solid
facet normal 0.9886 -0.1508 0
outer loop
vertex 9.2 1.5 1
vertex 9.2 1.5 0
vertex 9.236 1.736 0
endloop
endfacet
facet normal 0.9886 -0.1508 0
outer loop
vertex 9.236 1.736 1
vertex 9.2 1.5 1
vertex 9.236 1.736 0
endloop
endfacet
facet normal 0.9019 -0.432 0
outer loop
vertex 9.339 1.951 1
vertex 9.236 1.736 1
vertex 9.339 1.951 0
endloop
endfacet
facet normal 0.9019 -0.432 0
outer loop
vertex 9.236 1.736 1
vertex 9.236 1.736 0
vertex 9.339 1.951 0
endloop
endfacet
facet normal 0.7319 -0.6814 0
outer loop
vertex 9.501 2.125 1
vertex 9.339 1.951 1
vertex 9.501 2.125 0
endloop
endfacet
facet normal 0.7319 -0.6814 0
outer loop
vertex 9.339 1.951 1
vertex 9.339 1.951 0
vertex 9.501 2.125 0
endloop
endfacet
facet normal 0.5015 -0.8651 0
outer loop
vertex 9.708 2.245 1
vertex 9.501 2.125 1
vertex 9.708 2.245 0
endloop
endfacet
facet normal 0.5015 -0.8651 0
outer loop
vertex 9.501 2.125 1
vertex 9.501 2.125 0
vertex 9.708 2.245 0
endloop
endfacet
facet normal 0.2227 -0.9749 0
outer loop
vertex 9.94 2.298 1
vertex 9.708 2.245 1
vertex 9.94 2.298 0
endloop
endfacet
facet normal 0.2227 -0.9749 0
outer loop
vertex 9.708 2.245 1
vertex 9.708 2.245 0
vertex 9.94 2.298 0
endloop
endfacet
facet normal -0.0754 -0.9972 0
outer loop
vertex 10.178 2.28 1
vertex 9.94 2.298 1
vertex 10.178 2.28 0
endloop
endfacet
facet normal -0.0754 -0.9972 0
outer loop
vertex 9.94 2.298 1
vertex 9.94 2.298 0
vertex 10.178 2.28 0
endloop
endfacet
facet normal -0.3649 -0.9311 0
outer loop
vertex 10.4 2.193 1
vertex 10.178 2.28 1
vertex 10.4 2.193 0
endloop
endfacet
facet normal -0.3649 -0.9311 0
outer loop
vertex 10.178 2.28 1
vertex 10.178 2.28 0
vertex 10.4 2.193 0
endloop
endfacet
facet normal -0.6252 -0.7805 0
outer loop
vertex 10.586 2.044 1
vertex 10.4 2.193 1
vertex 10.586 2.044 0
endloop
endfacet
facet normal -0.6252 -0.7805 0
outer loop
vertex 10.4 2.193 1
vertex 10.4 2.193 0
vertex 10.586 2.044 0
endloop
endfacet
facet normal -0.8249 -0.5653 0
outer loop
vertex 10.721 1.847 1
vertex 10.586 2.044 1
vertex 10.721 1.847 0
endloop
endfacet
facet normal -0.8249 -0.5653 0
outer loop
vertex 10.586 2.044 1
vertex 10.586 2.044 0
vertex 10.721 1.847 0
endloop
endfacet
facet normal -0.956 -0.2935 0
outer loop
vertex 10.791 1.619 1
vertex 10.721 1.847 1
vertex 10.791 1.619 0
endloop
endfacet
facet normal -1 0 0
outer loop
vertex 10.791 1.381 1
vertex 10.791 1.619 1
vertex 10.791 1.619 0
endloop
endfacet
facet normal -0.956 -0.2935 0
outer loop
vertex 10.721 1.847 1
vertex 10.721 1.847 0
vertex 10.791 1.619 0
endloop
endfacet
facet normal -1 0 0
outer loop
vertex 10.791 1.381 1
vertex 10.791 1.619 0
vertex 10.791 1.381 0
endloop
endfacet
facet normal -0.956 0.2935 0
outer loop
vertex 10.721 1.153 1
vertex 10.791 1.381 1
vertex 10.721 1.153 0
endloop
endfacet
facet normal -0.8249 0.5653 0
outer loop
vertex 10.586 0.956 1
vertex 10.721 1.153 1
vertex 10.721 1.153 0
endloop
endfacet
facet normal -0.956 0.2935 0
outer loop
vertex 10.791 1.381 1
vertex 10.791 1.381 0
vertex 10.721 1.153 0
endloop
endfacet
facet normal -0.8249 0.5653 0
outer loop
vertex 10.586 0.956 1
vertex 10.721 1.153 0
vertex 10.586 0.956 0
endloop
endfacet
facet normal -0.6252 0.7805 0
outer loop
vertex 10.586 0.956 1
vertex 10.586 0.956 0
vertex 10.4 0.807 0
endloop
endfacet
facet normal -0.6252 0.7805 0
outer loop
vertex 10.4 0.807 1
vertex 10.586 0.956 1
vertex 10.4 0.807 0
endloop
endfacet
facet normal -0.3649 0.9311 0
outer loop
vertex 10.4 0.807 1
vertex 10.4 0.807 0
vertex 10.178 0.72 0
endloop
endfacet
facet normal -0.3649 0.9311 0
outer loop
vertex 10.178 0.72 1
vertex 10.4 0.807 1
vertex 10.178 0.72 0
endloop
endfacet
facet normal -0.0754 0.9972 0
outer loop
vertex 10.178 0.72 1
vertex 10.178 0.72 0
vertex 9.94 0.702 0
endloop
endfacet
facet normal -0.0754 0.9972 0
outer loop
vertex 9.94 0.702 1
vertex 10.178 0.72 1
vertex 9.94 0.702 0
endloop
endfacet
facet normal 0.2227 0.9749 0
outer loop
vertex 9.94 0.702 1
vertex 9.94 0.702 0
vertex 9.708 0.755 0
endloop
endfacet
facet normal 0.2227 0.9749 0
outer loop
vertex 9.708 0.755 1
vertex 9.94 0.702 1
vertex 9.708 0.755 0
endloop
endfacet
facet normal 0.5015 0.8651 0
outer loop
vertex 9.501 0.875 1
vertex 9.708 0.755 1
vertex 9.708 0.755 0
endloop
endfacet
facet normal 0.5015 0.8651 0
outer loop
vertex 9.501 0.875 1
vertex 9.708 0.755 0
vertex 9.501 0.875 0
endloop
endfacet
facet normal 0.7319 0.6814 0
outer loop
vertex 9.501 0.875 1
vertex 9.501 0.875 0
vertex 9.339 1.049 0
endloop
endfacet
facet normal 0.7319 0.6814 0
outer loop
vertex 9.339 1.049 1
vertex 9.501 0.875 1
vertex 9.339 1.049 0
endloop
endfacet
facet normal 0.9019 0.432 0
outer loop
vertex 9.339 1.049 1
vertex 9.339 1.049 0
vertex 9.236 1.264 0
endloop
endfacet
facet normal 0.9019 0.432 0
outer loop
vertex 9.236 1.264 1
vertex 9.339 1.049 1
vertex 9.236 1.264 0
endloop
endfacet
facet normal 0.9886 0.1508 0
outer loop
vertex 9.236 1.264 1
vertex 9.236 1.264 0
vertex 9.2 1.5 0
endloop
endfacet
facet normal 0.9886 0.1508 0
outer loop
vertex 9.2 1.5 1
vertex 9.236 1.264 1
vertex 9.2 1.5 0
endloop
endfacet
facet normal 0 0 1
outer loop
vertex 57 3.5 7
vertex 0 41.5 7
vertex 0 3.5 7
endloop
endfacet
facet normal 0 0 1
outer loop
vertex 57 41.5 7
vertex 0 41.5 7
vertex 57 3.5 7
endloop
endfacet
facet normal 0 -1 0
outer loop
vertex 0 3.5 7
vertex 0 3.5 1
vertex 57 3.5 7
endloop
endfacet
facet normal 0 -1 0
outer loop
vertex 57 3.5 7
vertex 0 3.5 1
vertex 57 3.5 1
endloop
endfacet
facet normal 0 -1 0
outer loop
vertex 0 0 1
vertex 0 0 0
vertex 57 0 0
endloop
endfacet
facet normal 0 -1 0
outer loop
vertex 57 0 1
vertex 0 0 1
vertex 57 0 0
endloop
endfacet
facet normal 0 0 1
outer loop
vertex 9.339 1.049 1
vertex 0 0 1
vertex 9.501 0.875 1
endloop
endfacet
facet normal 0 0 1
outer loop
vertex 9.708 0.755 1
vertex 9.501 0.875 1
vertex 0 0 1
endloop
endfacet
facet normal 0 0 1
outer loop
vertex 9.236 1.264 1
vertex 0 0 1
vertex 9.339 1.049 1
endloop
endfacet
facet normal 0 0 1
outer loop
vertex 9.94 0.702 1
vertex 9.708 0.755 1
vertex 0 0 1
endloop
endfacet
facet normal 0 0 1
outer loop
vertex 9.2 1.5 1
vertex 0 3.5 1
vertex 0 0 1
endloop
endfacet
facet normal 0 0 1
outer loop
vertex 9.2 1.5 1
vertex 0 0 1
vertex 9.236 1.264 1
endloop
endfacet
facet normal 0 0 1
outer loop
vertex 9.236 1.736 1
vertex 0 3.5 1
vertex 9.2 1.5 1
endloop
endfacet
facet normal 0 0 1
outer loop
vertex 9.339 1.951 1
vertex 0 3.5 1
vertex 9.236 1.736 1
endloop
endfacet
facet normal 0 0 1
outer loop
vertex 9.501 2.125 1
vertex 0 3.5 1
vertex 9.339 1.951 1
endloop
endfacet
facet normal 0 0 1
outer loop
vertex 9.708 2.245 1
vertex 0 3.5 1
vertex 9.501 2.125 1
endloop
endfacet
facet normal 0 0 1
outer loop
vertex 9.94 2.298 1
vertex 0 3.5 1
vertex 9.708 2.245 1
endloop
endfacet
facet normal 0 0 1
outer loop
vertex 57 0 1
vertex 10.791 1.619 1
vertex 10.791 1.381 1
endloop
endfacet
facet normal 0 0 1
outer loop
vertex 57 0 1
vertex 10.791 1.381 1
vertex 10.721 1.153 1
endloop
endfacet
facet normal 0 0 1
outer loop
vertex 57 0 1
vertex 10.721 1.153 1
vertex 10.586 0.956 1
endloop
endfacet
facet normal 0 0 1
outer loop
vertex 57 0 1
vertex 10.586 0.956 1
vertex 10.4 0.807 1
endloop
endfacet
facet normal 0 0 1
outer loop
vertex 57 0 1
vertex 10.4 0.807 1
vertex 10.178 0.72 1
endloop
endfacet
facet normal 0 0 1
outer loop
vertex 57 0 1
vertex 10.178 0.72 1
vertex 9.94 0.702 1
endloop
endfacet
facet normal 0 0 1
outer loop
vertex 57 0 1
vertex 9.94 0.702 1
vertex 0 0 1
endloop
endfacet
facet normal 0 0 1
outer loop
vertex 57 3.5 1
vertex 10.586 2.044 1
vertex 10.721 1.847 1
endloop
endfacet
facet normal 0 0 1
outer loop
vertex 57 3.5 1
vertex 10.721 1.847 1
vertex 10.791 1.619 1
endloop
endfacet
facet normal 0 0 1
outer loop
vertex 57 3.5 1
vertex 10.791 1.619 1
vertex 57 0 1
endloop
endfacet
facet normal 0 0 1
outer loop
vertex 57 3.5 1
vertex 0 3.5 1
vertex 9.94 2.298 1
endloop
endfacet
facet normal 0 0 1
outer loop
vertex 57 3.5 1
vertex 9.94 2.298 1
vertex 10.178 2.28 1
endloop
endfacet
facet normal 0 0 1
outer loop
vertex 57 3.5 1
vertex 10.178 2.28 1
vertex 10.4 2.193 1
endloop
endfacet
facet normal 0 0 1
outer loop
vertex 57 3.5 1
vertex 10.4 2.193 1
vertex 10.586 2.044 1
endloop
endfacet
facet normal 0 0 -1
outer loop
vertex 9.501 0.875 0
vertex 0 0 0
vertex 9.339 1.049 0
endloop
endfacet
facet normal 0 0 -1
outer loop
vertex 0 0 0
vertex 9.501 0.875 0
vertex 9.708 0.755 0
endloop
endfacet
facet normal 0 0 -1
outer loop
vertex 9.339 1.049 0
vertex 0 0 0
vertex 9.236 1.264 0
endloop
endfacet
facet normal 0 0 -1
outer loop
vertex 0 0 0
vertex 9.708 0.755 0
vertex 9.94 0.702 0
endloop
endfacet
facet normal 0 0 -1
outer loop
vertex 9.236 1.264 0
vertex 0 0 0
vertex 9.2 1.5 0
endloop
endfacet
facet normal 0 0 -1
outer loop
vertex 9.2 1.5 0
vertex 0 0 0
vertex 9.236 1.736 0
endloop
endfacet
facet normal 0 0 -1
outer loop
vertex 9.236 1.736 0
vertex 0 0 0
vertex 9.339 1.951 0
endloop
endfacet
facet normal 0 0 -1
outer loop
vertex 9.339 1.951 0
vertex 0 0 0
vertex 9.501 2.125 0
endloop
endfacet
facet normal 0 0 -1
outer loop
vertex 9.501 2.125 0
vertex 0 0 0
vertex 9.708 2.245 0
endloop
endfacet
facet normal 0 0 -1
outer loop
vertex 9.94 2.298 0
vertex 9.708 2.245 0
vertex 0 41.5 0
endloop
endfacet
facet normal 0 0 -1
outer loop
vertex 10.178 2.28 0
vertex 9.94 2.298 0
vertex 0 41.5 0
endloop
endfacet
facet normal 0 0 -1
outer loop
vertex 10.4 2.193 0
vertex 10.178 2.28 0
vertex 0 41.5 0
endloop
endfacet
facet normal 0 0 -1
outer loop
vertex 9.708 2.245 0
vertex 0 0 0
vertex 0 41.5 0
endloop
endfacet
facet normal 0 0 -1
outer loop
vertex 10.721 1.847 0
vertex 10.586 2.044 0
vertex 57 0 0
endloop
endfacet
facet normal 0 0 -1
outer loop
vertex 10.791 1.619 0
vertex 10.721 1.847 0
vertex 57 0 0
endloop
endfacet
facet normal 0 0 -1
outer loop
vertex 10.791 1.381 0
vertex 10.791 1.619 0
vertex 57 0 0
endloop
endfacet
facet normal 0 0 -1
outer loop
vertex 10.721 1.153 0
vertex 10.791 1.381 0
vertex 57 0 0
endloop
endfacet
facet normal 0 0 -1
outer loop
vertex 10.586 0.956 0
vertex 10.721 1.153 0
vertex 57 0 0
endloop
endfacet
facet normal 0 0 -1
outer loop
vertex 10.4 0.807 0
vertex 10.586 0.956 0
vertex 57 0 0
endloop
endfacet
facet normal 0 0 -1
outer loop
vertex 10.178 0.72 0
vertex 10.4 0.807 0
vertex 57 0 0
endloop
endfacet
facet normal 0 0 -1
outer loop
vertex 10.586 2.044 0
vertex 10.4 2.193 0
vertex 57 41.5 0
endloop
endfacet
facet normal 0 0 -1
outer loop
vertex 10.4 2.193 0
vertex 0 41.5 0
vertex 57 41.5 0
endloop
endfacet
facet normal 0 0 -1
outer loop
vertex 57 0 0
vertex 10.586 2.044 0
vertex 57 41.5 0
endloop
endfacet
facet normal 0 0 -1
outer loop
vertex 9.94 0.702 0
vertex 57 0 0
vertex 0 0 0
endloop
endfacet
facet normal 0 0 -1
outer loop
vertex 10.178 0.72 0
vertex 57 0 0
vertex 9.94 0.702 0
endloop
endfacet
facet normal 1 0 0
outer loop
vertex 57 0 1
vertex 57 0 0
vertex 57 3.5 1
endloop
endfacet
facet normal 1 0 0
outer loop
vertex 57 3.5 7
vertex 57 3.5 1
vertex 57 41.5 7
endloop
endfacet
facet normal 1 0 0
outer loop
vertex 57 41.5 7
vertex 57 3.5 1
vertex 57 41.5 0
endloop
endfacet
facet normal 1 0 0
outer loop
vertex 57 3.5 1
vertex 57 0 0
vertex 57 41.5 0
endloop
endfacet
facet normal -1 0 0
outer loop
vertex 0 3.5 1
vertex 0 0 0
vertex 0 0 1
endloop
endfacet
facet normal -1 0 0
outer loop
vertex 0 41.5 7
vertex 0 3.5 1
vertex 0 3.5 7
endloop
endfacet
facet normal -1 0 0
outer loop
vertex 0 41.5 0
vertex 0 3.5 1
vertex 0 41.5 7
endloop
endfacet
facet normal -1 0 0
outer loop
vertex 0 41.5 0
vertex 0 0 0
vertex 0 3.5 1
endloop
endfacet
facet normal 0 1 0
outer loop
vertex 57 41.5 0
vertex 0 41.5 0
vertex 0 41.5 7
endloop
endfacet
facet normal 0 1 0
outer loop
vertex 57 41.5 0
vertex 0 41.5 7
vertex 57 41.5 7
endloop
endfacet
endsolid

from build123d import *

# Parameters (mm, degrees)
SKETCH1_W             = 57
SKETCH1_H             = 41.5
BOSS_EXTRUDE1_DEPTH   = 1
SKETCH2_W             = 57
SKETCH2_H             = 38
BOSS_EXTRUDE2_DEPTH   = 6
F_1_0MM_DOWEL_HOLE1_D = 1.6


with BuildPart() as part:
    # Sketch1 → Boss-Extrude1 (new body)
    with BuildSketch(Plane.XY):
        with Locations((28.5, 20.75)):
            Rectangle(SKETCH1_W, SKETCH1_H)
    extrude(amount=BOSS_EXTRUDE1_DEPTH)

    # Sketch2 → Boss-Extrude2 (add)
    with BuildSketch(Plane.XY.offset(1)):
        with Locations((28.5, 22.5)):
            Rectangle(SKETCH2_W, SKETCH2_H)
    extrude(amount=BOSS_EXTRUDE2_DEPTH)

    # Ø1.0mm Dowel Hole1 (through all)
    with Locations(Plane(origin=(10, 1.5, 1), x_dir=(1, 0, 0), z_dir=(0, 0, 1))):
        with Locations((0, 0)):
            Hole(F_1_0MM_DOWEL_HOLE1_D / 2)


solid = part.part
